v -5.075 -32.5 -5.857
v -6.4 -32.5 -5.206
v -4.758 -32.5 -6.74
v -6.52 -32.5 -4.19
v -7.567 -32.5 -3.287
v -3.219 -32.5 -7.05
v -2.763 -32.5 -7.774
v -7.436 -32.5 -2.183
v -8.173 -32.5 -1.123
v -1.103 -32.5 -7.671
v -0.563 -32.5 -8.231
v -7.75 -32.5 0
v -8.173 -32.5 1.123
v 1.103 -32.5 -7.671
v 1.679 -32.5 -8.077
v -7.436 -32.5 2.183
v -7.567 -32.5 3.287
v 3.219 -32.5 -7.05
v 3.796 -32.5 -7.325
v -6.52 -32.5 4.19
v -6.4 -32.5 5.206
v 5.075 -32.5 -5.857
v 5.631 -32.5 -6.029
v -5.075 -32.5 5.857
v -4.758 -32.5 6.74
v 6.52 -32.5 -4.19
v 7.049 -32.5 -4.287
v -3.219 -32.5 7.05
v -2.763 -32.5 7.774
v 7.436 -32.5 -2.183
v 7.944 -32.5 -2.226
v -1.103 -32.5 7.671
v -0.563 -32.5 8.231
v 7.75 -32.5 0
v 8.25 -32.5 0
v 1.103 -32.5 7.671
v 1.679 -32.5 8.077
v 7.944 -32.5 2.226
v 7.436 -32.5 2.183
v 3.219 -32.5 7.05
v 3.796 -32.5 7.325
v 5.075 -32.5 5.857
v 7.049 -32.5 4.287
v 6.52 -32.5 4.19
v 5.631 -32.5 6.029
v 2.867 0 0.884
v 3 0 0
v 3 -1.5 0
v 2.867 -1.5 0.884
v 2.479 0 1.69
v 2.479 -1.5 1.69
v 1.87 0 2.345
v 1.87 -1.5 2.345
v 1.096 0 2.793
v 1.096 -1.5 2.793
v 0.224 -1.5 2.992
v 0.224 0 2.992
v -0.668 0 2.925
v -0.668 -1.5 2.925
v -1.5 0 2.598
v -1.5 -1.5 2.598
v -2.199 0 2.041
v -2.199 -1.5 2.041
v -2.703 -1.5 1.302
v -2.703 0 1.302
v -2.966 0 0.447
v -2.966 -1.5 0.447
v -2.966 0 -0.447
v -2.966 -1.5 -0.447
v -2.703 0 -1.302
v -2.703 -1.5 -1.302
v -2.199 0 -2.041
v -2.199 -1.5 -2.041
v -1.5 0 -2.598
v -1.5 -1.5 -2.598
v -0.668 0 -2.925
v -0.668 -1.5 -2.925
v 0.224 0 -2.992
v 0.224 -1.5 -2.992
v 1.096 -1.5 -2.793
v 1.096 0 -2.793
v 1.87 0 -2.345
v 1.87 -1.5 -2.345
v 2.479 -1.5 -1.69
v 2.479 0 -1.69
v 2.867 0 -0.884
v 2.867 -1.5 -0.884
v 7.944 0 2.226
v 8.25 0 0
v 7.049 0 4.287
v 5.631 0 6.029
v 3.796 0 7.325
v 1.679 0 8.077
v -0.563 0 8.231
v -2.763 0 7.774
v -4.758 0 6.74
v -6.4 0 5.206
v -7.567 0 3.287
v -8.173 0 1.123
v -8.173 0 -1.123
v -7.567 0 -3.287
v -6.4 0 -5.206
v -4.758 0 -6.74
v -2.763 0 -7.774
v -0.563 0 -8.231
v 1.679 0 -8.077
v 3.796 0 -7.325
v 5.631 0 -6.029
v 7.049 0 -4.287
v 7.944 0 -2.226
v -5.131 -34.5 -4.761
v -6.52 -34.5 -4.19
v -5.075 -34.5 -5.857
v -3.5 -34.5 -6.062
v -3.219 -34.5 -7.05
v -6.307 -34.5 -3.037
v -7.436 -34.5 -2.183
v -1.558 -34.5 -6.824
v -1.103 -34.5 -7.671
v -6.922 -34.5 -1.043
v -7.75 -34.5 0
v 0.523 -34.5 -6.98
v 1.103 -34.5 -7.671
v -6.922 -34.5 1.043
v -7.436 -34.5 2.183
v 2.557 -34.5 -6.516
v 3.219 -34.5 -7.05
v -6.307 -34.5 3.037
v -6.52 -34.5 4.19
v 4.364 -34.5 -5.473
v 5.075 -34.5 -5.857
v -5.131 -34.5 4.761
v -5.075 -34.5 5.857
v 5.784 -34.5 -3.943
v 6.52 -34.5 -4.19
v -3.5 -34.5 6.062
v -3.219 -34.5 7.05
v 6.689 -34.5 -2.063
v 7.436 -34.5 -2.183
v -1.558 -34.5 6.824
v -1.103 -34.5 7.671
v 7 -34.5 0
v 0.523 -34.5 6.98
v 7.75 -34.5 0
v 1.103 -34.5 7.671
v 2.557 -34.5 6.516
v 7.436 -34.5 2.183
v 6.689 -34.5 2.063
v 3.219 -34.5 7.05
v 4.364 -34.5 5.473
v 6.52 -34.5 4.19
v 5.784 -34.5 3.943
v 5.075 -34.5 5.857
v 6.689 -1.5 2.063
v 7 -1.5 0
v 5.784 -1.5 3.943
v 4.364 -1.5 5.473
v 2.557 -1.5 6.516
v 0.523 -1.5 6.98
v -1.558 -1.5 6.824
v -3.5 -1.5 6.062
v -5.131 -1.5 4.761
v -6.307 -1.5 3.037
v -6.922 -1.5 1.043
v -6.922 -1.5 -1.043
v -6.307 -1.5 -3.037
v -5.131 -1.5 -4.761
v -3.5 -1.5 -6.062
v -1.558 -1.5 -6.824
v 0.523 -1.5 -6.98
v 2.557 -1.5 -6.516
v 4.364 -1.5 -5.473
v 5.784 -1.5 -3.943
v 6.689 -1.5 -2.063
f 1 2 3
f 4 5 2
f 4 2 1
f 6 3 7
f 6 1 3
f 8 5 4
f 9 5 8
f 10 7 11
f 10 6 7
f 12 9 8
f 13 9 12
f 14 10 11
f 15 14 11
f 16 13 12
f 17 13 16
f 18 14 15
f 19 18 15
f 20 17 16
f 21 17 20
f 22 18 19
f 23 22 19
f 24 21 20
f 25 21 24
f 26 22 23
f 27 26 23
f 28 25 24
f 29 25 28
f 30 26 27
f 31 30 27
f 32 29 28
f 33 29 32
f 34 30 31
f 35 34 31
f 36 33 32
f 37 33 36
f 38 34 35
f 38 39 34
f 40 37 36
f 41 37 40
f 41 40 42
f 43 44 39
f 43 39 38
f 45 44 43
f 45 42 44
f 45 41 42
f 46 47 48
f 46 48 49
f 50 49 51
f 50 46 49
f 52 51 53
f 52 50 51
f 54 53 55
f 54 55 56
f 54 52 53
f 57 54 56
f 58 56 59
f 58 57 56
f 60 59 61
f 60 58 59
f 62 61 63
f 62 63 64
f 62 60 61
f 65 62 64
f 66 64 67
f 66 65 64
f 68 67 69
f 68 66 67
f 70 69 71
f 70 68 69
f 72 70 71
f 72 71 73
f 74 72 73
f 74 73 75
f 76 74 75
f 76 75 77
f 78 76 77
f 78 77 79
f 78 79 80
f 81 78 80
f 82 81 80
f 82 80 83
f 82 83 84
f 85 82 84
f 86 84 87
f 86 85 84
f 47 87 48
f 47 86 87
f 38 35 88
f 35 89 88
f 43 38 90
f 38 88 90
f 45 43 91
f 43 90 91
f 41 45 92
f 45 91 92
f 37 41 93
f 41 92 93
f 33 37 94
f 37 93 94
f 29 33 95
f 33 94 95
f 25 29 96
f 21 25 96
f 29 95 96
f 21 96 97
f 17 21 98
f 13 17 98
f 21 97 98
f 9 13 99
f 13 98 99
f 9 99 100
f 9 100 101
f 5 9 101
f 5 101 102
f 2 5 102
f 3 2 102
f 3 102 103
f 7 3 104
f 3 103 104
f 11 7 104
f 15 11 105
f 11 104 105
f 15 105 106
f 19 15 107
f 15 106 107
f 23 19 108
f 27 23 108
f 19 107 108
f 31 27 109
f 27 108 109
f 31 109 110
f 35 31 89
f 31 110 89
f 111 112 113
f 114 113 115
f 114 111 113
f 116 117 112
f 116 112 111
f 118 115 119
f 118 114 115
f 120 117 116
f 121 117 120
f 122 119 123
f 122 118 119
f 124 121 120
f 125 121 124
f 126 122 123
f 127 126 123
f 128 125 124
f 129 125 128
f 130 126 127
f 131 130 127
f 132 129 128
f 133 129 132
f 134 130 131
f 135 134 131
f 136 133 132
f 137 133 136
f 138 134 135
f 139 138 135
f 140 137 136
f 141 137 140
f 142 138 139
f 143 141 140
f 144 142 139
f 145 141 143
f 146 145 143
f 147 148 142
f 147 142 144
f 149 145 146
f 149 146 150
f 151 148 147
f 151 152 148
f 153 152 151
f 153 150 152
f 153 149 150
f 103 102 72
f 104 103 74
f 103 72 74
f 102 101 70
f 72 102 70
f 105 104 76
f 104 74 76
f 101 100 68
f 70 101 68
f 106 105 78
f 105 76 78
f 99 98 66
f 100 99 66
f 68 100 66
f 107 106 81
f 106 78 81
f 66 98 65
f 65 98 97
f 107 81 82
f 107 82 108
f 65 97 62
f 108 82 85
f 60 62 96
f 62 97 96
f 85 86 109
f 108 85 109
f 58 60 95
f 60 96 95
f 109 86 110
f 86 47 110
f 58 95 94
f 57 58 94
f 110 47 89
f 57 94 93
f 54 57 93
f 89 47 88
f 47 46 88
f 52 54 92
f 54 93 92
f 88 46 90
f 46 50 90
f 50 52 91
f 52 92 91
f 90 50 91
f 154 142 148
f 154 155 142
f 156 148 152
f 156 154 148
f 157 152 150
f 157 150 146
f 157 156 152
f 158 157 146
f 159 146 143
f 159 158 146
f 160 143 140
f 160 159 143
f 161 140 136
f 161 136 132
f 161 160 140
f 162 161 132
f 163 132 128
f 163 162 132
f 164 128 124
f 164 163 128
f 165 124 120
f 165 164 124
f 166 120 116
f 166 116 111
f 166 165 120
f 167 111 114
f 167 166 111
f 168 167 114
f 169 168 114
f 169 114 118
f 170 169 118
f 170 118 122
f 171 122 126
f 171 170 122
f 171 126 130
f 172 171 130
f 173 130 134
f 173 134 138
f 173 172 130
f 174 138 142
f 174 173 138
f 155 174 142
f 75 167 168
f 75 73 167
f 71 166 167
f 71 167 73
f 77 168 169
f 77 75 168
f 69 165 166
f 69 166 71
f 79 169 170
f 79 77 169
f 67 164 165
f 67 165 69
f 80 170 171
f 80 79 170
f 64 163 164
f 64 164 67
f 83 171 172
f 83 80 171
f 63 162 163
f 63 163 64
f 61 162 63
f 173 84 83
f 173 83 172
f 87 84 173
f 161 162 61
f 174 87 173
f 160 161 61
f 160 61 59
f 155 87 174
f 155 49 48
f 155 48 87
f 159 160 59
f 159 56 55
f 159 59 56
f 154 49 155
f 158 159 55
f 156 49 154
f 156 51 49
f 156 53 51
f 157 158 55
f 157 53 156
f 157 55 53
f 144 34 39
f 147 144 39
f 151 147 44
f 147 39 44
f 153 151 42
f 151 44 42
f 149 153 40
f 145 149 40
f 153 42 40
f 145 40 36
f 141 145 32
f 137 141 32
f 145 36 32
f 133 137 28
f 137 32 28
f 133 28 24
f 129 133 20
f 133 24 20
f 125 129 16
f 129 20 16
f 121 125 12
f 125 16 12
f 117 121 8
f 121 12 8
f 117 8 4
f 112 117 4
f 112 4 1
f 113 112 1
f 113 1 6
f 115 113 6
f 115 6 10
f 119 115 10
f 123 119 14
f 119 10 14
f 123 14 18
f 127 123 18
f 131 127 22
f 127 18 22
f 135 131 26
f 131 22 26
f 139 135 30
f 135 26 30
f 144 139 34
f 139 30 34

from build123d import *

# Parameters (mm, degrees)
F0_R     = 8.25
F0_R_2   = 3
F1_DEPTH = 1.5
F2_R     = 8.25
F2_R_2   = 7
F3_DEPTH = 31
F4_R     = 7.75
F4_R_2   = 7
F5_DEPTH = 2
F7_ANGLE = 90


with BuildPart() as f1:
    # F0 (on Top) → F1 (new body)
    with BuildSketch(Plane.XY):
        Circle(F0_R)
        Circle(F0_R_2, mode=Mode.SUBTRACT)
    extrude(amount=F1_DEPTH)

    # F2 (on face) → F3 (join)
    with BuildSketch(Plane.XY.offset(1.5)):
        Circle(F2_R)
        Circle(F2_R_2, mode=Mode.SUBTRACT)
    extrude(amount=F3_DEPTH)

    # F4 (on face) → F5 (join)
    with BuildSketch(Plane.XY.offset(32.5)):
        Circle(F4_R)
        Circle(F4_R_2, mode=Mode.SUBTRACT)
    extrude(amount=F5_DEPTH)


with BuildPart() as f1_1:
    # F7: moved
    add(f1.part.rotate(Axis((6.326988, 0, 0), (1, 0, 0)), F7_ANGLE))


solid = f1_1.part
